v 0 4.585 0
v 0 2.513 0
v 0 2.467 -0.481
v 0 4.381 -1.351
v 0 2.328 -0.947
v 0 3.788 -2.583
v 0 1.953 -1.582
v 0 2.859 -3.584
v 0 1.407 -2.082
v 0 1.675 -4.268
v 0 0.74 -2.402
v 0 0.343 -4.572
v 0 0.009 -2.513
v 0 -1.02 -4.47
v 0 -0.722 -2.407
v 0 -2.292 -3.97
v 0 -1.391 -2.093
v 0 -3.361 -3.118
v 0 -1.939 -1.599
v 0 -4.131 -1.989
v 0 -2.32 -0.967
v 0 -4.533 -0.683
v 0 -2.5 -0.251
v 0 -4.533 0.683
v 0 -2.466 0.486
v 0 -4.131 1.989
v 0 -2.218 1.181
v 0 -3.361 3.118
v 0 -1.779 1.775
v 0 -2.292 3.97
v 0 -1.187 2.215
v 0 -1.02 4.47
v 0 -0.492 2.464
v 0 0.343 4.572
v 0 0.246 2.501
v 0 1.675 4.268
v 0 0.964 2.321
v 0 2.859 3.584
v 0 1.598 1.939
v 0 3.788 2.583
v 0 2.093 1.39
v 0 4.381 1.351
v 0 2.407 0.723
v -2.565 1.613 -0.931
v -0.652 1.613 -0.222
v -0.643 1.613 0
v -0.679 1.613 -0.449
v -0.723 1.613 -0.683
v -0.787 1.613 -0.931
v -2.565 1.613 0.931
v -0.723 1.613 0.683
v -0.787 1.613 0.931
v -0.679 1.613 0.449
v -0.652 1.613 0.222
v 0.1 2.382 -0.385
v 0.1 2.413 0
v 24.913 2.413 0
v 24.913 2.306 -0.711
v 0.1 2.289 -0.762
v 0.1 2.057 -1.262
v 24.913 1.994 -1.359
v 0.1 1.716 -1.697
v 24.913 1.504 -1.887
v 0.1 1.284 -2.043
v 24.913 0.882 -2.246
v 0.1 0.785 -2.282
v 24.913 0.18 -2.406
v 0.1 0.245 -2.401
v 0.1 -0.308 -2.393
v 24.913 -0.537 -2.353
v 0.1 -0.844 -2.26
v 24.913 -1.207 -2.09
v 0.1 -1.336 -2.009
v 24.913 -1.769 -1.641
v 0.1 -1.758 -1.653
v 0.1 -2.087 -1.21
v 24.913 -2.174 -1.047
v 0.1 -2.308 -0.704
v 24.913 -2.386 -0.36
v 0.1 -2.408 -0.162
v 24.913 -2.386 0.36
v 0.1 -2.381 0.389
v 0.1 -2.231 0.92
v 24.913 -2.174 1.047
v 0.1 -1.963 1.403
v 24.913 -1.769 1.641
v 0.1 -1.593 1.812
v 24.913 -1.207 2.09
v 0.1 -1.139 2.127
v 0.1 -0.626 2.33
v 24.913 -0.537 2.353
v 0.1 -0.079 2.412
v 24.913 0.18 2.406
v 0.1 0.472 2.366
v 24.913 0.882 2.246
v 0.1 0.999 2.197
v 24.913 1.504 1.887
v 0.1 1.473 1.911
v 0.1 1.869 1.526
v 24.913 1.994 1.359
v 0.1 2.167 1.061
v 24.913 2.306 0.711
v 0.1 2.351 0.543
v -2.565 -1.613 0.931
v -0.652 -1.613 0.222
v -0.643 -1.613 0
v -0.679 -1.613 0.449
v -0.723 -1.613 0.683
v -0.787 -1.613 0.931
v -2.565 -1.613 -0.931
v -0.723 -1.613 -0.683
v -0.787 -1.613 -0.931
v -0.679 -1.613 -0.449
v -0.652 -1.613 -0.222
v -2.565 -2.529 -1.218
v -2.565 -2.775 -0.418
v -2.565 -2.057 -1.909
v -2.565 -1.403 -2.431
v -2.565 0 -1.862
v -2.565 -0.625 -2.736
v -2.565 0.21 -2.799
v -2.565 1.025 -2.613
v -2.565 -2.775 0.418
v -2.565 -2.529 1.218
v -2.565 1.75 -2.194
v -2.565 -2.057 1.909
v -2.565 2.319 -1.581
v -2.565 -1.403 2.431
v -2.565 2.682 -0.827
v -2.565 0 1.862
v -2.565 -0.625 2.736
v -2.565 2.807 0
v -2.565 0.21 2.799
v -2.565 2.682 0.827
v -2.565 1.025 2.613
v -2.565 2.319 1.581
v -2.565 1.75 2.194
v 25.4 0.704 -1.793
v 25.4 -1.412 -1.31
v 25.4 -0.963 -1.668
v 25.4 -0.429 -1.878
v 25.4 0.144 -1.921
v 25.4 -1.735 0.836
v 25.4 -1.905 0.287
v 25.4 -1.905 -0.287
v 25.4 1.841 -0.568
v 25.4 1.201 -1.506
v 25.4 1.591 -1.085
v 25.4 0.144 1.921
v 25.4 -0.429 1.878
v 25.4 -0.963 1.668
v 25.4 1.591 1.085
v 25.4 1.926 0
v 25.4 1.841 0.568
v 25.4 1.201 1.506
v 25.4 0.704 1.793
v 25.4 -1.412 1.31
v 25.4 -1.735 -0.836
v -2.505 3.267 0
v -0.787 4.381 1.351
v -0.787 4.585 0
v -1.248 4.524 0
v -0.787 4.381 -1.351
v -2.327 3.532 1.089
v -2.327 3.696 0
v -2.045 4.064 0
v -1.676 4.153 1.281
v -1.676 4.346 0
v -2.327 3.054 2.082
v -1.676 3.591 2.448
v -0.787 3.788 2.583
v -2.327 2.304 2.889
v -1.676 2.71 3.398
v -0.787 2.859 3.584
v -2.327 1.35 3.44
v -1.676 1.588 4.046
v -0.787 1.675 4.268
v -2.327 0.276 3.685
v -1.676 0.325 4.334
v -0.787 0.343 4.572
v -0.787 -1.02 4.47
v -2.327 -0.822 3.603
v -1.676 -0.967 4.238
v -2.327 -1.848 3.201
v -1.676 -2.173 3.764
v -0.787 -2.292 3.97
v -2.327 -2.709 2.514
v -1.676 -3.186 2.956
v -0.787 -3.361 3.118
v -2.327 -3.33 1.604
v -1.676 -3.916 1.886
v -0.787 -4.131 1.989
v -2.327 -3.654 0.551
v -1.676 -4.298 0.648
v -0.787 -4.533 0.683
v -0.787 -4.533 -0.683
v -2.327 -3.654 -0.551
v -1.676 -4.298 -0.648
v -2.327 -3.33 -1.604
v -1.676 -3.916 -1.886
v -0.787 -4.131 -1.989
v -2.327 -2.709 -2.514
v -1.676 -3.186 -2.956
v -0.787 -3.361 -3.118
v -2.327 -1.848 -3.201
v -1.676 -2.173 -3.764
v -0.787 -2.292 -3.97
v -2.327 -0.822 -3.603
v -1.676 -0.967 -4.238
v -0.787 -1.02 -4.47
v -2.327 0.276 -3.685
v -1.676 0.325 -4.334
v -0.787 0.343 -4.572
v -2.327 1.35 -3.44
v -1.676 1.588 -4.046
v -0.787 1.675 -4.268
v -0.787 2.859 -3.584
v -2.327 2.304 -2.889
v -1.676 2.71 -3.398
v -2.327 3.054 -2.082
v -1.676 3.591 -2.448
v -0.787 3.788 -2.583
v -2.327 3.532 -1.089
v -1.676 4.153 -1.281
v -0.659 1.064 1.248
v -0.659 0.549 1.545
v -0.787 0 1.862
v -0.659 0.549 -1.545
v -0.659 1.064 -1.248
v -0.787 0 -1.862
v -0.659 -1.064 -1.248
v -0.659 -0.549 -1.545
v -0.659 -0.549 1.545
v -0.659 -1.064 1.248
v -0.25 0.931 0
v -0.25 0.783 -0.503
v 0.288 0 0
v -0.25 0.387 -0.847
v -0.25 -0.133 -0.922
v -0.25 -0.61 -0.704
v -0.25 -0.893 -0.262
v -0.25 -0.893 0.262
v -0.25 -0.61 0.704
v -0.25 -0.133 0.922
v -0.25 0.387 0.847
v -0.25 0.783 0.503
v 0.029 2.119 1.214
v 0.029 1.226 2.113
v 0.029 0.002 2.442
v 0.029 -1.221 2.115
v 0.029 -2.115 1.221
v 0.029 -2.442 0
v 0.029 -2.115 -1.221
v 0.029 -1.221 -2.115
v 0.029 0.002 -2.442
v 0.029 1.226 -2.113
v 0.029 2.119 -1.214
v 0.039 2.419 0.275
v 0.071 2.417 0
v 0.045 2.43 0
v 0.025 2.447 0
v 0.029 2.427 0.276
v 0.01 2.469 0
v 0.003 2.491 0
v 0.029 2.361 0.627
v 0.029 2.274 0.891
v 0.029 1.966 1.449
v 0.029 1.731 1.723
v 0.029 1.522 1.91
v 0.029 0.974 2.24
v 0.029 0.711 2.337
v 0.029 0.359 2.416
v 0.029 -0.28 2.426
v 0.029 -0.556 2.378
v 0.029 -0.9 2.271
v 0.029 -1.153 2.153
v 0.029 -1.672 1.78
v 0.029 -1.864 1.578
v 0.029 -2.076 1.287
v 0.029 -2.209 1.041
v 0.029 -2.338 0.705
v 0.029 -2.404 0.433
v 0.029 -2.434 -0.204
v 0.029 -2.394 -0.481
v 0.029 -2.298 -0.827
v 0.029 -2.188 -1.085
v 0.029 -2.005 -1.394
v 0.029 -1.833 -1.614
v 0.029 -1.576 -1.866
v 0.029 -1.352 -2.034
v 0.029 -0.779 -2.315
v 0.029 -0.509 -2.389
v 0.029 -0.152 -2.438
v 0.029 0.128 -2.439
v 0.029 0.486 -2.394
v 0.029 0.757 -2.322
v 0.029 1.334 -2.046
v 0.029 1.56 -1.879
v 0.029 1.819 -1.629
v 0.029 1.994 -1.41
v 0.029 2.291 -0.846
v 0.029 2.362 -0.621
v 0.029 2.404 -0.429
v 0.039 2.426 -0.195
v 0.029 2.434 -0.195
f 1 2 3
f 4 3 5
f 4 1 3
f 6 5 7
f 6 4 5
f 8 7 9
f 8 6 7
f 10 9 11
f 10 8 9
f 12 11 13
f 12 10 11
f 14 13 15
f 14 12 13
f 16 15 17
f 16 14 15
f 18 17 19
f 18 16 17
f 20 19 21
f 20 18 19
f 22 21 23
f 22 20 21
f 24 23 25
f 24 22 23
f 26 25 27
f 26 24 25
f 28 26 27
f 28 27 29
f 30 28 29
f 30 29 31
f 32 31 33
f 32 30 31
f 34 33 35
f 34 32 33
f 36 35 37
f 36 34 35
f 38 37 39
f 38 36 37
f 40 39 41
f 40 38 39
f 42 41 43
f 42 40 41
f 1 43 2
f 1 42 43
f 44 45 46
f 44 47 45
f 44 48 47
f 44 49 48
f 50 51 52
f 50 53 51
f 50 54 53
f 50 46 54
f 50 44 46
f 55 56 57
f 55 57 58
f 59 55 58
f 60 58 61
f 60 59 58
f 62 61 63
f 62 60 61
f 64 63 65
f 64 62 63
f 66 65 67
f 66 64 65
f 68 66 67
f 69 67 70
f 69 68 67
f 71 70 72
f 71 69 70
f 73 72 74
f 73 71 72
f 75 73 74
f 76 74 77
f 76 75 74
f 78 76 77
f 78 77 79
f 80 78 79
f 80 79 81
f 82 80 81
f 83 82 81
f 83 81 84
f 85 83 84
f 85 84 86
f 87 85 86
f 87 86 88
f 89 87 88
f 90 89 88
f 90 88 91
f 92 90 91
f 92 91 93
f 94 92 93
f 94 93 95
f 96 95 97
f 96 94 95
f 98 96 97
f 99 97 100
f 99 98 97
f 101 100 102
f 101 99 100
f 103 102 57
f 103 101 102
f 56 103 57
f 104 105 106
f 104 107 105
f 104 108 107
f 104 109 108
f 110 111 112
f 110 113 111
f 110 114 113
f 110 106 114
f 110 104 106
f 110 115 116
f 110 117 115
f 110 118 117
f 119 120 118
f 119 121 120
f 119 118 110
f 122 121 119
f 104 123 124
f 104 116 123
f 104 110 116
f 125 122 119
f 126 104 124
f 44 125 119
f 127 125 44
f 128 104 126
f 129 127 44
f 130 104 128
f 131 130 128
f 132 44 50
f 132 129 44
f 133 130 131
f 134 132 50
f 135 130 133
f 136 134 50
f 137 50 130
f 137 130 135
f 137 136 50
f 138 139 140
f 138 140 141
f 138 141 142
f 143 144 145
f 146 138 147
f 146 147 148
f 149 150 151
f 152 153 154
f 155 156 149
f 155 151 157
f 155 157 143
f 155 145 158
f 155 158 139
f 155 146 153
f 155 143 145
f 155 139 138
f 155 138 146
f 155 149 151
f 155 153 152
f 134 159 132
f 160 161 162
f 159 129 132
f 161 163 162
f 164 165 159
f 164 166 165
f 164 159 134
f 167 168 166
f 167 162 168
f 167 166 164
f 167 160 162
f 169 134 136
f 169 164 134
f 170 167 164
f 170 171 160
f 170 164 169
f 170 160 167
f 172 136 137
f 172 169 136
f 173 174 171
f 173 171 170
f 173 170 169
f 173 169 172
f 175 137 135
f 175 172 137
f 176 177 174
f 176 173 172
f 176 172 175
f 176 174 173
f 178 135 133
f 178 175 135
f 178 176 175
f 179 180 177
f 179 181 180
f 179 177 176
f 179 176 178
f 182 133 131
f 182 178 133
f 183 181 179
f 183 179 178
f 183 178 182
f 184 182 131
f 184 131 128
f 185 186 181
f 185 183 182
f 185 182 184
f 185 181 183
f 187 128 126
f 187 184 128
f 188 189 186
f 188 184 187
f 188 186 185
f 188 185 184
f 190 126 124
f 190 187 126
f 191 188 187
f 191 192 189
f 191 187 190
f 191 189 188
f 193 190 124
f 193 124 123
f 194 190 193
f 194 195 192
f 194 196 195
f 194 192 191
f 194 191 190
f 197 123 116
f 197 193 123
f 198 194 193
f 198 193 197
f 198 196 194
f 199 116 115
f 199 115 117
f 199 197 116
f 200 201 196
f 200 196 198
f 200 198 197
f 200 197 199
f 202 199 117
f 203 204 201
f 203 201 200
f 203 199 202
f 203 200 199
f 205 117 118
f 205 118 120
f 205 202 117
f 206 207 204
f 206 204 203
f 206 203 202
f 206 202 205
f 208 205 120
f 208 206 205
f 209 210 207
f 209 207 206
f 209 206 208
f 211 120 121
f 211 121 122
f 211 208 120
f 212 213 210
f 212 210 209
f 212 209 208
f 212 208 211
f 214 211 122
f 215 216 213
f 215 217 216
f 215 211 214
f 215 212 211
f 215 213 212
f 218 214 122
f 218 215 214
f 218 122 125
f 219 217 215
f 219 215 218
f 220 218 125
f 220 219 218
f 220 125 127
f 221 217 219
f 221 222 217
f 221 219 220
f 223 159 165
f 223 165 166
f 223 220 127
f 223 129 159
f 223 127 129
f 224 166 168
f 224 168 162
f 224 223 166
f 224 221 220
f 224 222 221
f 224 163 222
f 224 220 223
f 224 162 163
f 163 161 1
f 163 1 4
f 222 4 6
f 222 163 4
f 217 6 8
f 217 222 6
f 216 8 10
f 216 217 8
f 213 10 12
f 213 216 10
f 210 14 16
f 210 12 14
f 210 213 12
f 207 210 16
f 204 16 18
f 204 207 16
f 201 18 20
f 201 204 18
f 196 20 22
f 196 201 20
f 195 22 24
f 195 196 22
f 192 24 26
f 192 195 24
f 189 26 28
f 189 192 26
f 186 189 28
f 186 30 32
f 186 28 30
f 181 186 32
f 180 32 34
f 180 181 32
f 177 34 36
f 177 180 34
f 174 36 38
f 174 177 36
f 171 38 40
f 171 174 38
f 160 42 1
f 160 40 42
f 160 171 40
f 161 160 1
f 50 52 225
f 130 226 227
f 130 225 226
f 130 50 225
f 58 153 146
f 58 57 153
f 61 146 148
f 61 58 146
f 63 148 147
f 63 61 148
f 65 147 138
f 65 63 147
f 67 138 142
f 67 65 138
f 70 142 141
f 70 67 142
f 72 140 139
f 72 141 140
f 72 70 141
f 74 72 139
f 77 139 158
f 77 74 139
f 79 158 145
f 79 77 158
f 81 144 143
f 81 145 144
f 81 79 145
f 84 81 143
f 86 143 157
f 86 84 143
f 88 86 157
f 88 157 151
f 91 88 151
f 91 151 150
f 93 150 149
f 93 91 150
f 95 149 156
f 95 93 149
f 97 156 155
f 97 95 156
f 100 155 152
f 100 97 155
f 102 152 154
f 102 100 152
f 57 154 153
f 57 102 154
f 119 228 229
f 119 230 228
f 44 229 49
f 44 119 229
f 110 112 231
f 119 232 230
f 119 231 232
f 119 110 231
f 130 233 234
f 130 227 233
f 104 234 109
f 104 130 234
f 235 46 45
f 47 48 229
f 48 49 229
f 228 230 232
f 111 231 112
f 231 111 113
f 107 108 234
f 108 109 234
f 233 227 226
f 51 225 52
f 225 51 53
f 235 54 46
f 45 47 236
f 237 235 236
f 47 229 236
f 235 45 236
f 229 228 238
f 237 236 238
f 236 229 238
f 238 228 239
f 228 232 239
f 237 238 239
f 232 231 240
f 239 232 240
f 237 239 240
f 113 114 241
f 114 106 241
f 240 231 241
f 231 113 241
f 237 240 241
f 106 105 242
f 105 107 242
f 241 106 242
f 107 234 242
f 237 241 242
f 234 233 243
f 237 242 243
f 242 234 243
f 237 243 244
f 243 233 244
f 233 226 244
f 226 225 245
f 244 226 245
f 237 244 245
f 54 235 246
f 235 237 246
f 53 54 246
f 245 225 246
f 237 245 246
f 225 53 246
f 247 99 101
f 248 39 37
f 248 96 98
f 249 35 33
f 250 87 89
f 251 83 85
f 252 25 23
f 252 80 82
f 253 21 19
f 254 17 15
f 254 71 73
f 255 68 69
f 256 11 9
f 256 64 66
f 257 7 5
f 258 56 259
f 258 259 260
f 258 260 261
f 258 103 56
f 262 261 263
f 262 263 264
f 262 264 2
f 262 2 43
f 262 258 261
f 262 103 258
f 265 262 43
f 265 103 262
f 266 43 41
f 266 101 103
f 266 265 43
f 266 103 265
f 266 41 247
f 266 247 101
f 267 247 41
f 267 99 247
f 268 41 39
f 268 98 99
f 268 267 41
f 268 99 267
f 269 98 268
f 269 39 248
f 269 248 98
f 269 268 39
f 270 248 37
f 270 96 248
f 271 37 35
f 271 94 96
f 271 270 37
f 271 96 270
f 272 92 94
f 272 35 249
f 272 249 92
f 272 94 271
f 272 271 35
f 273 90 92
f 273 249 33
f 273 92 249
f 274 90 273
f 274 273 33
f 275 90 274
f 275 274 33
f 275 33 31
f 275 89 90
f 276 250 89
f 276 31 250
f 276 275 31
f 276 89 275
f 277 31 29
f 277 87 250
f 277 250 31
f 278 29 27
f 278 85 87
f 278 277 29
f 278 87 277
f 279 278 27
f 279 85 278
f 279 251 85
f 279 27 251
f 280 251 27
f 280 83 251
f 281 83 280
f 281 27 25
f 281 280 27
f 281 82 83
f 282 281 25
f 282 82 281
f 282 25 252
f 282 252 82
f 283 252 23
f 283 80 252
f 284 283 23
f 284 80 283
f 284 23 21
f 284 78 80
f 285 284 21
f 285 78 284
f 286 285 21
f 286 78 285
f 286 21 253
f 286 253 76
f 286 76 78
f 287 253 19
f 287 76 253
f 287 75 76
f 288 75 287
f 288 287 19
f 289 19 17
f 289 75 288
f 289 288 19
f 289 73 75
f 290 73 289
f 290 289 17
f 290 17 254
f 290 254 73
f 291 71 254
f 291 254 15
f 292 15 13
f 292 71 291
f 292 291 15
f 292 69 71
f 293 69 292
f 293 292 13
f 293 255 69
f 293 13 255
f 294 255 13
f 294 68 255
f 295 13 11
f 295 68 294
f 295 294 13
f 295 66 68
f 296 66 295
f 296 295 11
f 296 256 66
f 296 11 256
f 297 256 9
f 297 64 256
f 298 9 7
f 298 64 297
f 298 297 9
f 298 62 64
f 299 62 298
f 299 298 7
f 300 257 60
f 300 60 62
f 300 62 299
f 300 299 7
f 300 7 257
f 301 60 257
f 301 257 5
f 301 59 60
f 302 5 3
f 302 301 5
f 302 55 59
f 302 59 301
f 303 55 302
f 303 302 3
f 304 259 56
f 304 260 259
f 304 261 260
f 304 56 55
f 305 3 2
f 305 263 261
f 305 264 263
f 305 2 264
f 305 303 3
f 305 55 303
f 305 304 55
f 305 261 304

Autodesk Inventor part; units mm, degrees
ref_plane "YZ Plane" through (0, 0, 0) normal (1, 0, 0) x (0, 1, 0)
ref_plane "XZ Plane" through (0, 0, 0) normal (0, 1, 0) x (-1, 0, 0)
sketch "Sketch1" plane through (0, 0, 0) normal (0, 0, 1) x (1, 0, 0)
  line L0 (0.2879, 0) -> (25.4, 0)
  line L1 (25.4, 0) -> (25.4, 2.413)
  line L2 (25.4, 2.413) -> (1.5878, 2.413)
  line L3 (1.5878, 2.413) -> (0.0002, 2.413)
  line L4 (0.0002, 2.413) -> (0, 2.413)
  line L5 (0, 2.413) -> (0, 4.5847)
  line L6 (0, 4.5847) -> (-2.5654, 4.5847)
  line L7 (-2.5654, 4.5847) -> (-2.5654, 1.8624)
  line L8 (-2.5654, 1.8624) -> (-0.7874, 1.8624)
  line L9 (-0.7874, 1.8624) -> (0.2879, 0)
  line L10 (-8.1585, 0) -> (30.9931, 0) projected
  line L11 (0, -0.9169) -> (0, 5.5016) projected
  line L12 (1.5878, 2.413) -> (0, 2.413) construction
  dimension "d1" = 23.8122
  dimension "d2" = 1.5876
  dimension "d3" = 2.5654
  dimension "d4" = 1.778
  dimension "d5" = 60
  dimension "d6" = 4.826
  dimension "d7" = 4.826
  dimension "d8" = 3.7248
  dimension "d9" = 9.1694
  dimension "d26" = 25.4
revolve "Body" add sketch "Sketch1" angle 360 about axis through (0.2879, 0, 0) along (1, 0, 0) contours L9 L11 L3 L2 L1 L0 | L9 L8 L7 L6 L5 L11
sketch "Sketch2" plane through (-2.5654, 0, 0) normal (-1, 0, 0) x (0, 0, 1)
  circle A0 centre (0, 0) radius 1.8624 projected
  line L0 (0, -6.4186) -> (0, 6.4186) projected
  line L1 (-6.4186, 0) -> (6.4186, 0) projected
  line L2 (1.8624, 0) -> (0.9312, -1.6129)
  line L3 (0.9312, -1.6129) -> (-0.9312, -1.6129)
  line L4 (-0.9312, -1.6129) -> (-1.8624, 0)
  line L5 (-1.8624, 0) -> (-0.9312, 1.6129)
  line L6 (-0.9312, 1.6129) -> (0.9312, 1.6129)
  line L7 (0.9312, 1.6129) -> (1.8624, 0)
extrude "Slot" add sketch "Sketch2" against normal up to next contours L7 A0 | A0 L2 | L6 L0 A0 | A0 L0 L3 | L0 L6 A0 | A0 L3 L0 | L4 A0 | A0 L5
fillet "Fillet1" radius 1.778 1 edges at (-2.5654, -4.5847, 0)
thread "Thread" size "10-32 UNF" class "2A" standard "ANSI Unified Screw Threads" length 23.8122
chamfer "Chamfer1" distance 0.4869 distance2 0.4869 1 edges at (25.4, -2.413, 0) measured on face at (25.4, 0.9527, 0.2826)
ref_plane "Work Plane1" through (29, 0, 0) normal (0, -1, 0) x (1, 0, 0)
fillet "Fillet2" radius 0.1 1 edges at (0.0002, -2.413, 0)
equation "\"d30\" = R"
equation "\"d17\" = RR"
equation "\"d13\" = GEL"
equation "\"d15\" = -0.5 * SPD + 0.5 * GD"
equation "\"d16\" = GUL"
equation "\"d1\" = GEL"
equation "\"d3\" = KOH"
equation "\"d4\" = INTI"
equation "\"d6\" = GD"
equation "\"d7\" = BDM"
equation "\"d8\" = 1.1547 * SW"
equation "\"d9\" = KOD"
equation "\"d26\" = NLG"
equation "\"GD\" = NND"
equation "\"NLG\" = 25.4"
equation "\"GEL\" = 23.81225"
equation "\"KOD\" = 9.1694"
equation "\"KOH\" = 2.5654"
equation "\"INTI\" = 1.778"
equation "\"GAL\" = 1.5875"
equation "\"GUL\" = 0.48692"
equation "\"BDM\" = NND"
equation "\"SW\" = 3.2258"
equation "\"RR\" = 1.778"
equation "\"SPD\" = GD1"
equation "\"R\" = 0.1"
equation "\"KR\" = 4.699"
equation "\"GD1\" = 3.85216"
equation "\"THREADDIA\" = 4.826"
equation "\"FAWI\" = 45deg"
equation "\"KOH1\" = 1.778"
equation "\"NND\" = 4.826"
equation "\"TOA\" = 30deg"
equation "\"E0\" = 1.155 * SW"
properties part number "Unbrako - 10 x 1" material "Steel, Mild"
